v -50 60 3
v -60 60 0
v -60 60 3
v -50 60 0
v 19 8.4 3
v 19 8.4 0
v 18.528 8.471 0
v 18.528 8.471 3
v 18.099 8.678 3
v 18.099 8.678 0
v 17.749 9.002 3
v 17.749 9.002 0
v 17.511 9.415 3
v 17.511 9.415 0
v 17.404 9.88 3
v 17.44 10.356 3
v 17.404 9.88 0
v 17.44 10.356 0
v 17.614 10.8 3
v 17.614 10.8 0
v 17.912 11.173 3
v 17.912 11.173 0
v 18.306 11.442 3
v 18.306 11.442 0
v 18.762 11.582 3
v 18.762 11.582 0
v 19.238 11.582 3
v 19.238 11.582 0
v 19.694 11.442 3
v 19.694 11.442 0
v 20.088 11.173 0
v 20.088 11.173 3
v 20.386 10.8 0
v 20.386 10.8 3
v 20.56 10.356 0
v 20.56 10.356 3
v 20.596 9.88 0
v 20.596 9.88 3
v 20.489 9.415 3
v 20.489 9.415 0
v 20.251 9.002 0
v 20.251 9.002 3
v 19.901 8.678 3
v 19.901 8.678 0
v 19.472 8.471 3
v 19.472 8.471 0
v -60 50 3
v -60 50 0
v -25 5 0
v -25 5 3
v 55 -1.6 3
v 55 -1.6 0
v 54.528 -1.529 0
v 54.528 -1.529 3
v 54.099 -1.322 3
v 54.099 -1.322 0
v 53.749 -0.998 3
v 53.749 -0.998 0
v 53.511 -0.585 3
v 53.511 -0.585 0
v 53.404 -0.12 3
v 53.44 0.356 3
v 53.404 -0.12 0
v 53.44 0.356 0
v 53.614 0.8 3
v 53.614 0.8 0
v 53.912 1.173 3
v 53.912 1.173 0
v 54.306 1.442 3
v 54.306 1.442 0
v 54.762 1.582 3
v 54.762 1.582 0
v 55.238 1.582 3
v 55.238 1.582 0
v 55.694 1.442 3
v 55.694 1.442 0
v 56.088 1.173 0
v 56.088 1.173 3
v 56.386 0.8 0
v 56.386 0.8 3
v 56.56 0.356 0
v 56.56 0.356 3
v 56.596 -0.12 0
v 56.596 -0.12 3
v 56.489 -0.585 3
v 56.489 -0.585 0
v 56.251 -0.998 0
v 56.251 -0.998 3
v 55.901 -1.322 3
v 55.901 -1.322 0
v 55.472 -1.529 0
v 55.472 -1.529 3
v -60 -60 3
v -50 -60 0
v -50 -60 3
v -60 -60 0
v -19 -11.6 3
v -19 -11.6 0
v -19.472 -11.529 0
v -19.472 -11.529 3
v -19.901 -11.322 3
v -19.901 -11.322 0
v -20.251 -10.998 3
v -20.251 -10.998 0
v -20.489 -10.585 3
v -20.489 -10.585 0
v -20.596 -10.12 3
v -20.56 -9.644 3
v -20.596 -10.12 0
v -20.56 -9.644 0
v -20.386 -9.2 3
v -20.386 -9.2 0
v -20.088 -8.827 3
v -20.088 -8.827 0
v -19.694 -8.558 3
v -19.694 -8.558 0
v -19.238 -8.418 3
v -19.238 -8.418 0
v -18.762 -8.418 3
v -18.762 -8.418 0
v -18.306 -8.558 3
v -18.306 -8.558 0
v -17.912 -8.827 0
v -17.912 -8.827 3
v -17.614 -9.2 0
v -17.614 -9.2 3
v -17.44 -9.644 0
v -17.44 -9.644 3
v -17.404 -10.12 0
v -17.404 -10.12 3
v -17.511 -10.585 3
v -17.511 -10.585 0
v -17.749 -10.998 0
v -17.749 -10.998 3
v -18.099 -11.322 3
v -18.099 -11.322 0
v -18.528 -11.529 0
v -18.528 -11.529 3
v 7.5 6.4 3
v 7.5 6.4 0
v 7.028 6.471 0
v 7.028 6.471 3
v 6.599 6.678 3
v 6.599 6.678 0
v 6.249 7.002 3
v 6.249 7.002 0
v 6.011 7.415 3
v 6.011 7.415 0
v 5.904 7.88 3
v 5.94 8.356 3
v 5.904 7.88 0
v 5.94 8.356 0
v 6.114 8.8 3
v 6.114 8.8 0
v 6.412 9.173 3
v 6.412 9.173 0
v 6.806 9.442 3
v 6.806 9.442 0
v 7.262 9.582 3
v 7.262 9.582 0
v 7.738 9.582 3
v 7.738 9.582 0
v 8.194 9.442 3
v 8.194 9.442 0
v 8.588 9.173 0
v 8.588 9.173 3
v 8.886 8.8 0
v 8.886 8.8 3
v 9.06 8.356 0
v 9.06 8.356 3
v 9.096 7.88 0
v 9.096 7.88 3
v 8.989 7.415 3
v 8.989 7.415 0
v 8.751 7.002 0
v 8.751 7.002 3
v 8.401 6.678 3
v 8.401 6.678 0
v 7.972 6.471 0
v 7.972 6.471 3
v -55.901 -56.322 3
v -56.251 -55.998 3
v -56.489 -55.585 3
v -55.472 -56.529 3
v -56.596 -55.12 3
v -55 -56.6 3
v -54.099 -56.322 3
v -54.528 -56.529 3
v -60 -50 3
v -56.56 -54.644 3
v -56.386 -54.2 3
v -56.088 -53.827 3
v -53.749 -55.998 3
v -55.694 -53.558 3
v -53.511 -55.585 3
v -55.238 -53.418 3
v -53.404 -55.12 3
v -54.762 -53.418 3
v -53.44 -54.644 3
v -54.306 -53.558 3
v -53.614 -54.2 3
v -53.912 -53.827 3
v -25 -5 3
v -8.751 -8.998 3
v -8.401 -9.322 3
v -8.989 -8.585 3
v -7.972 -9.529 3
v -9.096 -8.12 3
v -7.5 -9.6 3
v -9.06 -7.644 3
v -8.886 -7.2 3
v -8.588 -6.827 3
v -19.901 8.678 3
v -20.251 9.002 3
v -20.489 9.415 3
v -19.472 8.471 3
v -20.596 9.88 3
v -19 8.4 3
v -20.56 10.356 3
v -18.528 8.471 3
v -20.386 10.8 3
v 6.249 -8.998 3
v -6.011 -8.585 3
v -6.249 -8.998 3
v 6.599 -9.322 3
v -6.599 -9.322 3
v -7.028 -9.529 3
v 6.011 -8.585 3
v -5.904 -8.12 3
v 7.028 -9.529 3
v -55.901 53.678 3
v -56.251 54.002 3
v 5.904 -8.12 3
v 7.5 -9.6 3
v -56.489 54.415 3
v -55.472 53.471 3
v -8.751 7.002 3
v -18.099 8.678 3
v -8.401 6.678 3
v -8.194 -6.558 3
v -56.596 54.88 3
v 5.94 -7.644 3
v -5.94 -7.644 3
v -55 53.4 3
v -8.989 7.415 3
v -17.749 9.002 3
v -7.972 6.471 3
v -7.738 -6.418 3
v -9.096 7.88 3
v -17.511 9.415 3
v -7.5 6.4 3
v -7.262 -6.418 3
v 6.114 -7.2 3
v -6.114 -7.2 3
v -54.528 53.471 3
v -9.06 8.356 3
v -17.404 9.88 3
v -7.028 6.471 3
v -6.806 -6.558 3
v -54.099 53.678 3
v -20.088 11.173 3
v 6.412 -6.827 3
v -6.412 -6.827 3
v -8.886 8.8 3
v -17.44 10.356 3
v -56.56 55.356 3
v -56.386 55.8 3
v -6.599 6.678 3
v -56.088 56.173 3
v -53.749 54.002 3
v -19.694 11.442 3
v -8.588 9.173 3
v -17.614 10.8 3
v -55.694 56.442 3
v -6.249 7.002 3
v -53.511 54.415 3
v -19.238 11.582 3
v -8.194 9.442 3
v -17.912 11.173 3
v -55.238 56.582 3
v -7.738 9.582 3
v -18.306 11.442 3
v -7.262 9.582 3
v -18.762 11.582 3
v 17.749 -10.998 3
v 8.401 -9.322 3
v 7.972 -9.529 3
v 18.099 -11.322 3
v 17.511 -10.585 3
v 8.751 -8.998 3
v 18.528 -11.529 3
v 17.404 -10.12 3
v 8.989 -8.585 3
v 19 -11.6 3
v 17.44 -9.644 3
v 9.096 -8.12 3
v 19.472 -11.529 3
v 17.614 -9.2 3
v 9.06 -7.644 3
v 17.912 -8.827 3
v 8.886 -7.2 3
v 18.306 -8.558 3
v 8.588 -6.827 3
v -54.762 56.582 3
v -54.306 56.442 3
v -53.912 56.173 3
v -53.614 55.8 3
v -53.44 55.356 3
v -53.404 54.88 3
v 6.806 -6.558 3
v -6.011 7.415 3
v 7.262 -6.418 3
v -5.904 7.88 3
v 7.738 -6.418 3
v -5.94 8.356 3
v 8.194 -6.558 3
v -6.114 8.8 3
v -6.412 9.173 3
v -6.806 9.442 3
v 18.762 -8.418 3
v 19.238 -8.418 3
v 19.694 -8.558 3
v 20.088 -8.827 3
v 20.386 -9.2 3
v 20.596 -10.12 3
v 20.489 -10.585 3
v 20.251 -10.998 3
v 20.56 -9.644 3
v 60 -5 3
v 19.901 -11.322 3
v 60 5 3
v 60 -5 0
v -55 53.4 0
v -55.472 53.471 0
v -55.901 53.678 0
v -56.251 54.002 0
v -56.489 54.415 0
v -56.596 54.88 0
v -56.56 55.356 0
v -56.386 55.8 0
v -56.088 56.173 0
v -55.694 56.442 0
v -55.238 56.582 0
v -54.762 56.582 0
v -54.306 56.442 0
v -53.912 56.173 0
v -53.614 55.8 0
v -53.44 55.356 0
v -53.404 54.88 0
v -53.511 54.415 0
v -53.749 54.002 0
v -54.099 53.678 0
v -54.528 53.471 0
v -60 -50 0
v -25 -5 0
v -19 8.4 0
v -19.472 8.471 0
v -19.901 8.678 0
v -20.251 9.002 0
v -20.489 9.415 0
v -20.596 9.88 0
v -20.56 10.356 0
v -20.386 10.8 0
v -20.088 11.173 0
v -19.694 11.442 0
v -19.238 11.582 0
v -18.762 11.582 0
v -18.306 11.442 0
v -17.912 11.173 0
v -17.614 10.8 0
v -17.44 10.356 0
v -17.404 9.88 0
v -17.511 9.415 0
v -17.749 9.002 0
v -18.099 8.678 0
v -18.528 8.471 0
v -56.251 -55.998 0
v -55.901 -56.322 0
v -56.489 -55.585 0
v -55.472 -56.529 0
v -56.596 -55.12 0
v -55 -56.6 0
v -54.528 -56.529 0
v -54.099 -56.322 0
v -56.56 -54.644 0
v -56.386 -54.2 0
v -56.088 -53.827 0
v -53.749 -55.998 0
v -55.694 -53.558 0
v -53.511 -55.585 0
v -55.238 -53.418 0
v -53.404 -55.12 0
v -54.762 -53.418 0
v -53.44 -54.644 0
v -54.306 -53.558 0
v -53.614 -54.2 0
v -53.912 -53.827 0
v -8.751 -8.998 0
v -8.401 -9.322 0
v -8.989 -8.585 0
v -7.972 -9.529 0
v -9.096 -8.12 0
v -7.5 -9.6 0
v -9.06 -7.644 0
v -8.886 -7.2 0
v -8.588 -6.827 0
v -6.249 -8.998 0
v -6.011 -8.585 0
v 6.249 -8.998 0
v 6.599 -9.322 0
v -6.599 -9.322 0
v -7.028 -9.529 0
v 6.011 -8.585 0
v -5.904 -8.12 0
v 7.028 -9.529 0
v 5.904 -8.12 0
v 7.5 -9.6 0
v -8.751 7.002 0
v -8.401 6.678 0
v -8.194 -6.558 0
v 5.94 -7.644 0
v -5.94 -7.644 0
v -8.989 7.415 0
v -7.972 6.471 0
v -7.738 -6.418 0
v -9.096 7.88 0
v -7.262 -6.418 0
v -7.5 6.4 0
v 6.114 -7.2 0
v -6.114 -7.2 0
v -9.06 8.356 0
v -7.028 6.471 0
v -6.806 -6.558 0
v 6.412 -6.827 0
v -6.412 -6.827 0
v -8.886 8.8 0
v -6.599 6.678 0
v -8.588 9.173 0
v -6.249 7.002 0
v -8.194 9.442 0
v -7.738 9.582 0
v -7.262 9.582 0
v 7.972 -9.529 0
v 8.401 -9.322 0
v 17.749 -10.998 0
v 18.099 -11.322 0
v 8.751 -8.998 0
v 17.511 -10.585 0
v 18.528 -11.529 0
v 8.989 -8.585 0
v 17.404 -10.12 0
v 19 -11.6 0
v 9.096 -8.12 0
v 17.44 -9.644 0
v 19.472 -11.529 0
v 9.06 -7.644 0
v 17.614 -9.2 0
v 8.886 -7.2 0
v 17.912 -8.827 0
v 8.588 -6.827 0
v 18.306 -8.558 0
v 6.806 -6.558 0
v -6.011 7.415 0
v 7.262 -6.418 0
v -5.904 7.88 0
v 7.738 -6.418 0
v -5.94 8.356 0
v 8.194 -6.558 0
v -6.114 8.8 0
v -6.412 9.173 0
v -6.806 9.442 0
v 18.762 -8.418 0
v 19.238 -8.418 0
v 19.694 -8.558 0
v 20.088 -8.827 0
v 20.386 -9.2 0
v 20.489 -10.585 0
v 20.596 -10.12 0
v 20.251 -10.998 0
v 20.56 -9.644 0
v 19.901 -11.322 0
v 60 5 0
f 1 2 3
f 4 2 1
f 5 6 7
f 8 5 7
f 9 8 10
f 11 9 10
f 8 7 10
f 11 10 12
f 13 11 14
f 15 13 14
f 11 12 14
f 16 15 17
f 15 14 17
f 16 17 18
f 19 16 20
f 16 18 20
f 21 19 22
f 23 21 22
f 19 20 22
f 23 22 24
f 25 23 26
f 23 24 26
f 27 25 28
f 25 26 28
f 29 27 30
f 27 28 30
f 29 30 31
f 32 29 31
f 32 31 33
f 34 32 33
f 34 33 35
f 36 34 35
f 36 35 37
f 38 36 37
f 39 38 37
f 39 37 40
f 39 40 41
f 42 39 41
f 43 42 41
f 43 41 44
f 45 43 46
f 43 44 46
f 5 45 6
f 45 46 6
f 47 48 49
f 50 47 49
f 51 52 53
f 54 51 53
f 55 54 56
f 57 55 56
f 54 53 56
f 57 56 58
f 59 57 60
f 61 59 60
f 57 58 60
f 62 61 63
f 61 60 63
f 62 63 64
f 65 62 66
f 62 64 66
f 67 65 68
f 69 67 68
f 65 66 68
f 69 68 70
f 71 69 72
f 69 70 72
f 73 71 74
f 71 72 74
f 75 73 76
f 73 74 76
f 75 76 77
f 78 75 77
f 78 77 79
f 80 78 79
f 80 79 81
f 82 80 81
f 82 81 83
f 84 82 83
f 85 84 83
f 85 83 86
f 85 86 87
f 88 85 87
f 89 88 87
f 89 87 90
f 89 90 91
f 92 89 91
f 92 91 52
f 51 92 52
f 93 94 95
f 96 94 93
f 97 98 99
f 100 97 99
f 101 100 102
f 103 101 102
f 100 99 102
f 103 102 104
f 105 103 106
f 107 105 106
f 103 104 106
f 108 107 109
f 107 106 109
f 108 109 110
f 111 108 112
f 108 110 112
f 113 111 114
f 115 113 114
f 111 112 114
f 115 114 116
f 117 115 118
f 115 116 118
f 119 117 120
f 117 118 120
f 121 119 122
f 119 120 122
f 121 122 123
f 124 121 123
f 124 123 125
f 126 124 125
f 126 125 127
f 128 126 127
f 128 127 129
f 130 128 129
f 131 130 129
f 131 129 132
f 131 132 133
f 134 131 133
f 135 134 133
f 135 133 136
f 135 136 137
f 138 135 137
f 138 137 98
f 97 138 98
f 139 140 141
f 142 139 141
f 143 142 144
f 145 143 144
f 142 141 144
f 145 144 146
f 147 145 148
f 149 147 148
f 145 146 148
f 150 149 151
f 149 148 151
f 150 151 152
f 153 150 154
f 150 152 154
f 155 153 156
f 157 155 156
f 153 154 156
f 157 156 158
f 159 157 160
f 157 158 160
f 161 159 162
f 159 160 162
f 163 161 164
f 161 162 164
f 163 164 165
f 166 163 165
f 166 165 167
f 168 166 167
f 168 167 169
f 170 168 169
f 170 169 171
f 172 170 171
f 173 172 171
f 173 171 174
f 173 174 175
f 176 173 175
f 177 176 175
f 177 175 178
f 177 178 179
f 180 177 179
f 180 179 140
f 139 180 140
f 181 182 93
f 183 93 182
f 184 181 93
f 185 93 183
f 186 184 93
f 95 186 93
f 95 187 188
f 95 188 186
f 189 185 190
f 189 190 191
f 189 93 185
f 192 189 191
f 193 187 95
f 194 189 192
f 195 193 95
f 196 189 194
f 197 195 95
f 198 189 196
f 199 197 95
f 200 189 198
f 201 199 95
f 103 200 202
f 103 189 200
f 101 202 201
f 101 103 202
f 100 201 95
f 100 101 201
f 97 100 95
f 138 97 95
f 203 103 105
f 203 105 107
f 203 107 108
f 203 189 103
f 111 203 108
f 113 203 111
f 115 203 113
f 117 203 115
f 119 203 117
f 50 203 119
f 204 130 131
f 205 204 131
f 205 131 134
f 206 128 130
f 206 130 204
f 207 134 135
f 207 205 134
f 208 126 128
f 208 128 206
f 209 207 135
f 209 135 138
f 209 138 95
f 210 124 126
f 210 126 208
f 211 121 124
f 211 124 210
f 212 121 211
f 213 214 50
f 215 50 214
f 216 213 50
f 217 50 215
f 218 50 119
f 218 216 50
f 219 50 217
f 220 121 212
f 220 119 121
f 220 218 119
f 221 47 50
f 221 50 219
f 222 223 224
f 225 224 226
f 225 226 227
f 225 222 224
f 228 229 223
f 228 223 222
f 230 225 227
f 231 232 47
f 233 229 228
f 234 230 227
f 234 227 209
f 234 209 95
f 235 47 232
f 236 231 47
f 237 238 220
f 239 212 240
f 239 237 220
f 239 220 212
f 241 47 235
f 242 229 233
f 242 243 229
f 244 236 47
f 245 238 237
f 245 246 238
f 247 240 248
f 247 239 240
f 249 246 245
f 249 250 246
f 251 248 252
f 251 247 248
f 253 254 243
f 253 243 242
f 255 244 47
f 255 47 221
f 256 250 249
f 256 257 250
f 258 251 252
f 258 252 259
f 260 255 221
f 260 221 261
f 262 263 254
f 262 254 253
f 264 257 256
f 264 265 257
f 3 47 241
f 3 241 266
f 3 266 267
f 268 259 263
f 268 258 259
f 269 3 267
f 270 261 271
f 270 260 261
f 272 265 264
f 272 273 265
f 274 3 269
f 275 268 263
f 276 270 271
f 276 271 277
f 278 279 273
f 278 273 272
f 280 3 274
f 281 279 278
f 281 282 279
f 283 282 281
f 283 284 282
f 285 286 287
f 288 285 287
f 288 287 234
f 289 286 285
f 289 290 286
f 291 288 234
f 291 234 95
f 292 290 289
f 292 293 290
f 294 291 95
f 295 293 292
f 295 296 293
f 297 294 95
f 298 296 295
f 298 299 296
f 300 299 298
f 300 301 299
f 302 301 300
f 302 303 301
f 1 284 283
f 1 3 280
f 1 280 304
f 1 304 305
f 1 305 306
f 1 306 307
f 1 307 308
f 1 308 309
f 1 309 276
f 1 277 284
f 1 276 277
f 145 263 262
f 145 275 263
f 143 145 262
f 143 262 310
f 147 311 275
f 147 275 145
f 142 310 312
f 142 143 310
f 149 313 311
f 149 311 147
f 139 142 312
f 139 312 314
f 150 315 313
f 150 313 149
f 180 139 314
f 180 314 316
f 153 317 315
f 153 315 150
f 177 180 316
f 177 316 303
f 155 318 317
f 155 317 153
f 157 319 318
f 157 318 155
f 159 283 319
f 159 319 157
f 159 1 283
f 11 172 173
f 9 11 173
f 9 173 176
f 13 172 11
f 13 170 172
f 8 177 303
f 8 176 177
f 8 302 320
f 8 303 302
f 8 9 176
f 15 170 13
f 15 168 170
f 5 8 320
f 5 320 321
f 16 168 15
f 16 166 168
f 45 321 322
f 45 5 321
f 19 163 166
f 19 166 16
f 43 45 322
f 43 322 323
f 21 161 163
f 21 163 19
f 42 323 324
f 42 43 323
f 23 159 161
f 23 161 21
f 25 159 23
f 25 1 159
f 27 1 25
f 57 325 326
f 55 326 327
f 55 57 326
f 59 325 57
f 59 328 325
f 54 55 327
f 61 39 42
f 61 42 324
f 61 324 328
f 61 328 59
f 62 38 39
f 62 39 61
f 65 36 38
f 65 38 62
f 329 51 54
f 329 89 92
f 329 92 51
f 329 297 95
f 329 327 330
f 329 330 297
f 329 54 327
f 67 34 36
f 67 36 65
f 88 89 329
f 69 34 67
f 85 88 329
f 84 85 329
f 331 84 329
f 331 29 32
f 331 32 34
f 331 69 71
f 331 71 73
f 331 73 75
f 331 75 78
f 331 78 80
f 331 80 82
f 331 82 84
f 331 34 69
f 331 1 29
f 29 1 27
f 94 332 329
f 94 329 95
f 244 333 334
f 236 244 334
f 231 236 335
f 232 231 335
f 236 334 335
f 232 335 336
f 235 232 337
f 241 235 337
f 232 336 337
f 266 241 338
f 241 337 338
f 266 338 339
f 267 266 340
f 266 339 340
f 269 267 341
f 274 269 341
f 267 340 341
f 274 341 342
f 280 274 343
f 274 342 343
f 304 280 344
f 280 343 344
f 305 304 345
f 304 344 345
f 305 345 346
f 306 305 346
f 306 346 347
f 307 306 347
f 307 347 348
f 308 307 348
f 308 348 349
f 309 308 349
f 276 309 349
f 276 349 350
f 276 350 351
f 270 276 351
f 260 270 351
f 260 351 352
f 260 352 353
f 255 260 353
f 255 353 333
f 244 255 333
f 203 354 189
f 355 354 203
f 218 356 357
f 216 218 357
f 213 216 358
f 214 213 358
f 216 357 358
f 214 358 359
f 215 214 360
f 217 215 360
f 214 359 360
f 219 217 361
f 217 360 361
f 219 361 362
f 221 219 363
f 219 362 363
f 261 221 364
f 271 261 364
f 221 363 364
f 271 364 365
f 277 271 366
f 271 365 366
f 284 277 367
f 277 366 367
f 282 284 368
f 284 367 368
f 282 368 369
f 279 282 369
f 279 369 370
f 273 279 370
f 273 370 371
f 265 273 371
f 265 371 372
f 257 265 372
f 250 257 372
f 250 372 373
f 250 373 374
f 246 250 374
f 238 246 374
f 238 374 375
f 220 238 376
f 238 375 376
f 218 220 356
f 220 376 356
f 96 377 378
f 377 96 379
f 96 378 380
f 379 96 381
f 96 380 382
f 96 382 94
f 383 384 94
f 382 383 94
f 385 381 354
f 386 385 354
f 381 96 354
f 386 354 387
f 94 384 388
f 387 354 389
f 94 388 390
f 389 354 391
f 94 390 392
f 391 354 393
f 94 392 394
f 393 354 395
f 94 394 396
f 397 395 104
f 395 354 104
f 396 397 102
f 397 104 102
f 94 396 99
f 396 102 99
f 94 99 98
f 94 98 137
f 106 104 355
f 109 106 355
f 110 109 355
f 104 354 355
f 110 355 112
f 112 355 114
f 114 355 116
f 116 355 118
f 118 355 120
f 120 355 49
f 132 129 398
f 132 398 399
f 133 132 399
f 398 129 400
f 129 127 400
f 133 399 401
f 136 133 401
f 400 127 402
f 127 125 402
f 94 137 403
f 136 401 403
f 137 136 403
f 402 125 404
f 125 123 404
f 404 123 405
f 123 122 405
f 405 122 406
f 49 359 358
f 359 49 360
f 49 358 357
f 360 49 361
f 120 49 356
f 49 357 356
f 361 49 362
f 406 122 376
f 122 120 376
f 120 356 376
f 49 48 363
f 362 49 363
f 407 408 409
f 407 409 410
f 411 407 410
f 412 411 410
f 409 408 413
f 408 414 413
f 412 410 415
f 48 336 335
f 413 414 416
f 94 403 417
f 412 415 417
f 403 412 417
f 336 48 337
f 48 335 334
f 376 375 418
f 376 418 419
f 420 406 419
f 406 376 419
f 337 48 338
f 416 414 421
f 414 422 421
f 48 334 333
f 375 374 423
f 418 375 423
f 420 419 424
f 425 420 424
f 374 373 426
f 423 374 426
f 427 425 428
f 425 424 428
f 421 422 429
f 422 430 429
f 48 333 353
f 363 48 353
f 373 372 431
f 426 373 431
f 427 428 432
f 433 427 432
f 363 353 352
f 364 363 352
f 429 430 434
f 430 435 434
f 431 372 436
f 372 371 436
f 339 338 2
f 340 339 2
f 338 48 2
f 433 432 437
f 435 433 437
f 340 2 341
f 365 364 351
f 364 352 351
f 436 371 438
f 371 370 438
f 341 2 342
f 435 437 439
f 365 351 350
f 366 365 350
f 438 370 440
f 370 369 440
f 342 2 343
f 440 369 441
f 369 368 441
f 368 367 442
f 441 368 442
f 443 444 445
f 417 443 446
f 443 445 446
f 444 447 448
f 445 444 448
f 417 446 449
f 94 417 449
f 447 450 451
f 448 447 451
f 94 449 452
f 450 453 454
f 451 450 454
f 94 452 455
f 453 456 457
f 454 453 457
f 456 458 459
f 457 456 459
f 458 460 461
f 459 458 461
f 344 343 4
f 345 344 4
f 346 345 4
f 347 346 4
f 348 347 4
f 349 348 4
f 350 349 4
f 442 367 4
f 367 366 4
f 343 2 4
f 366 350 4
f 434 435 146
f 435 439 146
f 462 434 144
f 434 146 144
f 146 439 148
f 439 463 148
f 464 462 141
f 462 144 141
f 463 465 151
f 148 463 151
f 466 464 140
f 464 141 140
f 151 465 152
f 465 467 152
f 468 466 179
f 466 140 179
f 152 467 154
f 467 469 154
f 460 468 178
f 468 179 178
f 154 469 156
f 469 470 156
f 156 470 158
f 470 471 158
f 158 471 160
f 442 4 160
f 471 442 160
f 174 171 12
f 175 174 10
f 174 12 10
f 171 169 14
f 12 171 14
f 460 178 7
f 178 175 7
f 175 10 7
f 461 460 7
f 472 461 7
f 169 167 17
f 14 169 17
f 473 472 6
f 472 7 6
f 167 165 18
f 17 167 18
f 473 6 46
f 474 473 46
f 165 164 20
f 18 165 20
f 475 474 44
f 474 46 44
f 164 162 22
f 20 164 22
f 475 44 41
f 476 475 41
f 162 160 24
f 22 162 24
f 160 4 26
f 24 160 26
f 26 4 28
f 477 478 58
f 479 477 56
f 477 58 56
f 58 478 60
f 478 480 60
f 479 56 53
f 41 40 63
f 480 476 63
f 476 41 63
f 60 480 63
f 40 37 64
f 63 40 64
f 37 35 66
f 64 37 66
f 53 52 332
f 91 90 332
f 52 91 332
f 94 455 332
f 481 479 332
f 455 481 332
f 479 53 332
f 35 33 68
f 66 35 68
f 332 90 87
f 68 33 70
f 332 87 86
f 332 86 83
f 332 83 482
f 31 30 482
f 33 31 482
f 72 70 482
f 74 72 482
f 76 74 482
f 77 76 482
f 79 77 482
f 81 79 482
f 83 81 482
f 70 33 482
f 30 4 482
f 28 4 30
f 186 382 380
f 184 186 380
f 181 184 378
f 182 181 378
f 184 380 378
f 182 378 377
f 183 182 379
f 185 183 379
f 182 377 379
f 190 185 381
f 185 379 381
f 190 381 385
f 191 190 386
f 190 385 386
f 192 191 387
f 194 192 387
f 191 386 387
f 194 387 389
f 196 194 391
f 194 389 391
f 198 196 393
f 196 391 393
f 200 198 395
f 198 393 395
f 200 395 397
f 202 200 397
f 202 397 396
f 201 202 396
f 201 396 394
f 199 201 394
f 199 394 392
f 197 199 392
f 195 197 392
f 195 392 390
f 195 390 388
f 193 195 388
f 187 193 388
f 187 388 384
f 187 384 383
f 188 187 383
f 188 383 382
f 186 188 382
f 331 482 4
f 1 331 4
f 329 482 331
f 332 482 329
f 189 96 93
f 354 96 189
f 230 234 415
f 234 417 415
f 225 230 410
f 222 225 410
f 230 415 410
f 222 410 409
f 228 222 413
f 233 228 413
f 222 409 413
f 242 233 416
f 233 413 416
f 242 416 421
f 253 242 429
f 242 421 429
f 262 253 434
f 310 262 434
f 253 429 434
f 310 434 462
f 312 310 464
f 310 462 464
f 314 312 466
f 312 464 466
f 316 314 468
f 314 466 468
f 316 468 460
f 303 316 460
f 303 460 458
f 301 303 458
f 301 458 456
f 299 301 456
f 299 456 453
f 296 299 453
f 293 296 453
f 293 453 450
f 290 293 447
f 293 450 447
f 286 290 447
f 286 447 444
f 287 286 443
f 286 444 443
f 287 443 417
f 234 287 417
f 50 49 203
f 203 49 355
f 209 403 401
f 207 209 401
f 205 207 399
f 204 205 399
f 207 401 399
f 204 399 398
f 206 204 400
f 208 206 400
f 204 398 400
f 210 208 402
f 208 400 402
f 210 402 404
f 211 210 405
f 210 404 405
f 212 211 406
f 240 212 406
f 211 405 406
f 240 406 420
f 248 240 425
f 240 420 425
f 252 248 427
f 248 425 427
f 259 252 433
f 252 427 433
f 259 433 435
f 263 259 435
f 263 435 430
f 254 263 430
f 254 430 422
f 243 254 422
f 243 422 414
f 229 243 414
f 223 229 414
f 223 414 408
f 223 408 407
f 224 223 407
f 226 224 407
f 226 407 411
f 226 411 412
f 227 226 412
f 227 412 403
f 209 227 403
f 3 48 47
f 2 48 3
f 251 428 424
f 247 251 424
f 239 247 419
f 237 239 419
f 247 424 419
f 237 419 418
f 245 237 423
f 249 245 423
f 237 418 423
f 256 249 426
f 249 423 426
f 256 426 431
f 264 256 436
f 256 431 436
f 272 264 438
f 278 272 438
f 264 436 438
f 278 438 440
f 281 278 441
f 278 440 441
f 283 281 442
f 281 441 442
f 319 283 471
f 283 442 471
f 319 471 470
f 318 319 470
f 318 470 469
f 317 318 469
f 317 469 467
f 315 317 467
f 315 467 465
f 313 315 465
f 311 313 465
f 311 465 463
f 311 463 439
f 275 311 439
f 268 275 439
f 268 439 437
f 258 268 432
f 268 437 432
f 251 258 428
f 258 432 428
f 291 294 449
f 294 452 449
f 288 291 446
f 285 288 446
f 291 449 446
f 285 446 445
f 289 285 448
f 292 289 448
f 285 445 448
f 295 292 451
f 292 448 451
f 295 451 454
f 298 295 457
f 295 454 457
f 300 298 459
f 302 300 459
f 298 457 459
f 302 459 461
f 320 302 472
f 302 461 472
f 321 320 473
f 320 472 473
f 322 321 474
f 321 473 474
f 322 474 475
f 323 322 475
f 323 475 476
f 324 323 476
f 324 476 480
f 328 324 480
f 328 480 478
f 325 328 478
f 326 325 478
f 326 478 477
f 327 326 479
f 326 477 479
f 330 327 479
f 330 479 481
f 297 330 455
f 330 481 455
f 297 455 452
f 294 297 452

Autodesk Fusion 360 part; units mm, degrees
sketch "Sketch1" plane through (0, 0, 0) normal (0, 0, 1) x (1, 0, 0)
  line L0 (60, -60) -> (-60, -60)
  line L1 (-60, -60) -> (-60, 60)
  line L2 (-60, 60) -> (60, 60)
  line L3 (60, 60) -> (60, -60)
  line L4 (60, -60) -> (-60, 60) construction
  line L5 (-60, -60) -> (60, 60) construction
  line L6 (25, 20) -> (-25, 20)
  line L7 (-25, 20) -> (-25, -20)
  line L8 (-25, -20) -> (25, -20)
  line L9 (25, -20) -> (25, 20)
  line L10 (25, 20) -> (-25, -20) construction
  line L11 (-25, 20) -> (25, -20) construction
  line L12 (60, 5) -> (-50, 60)
  line L13 (60, -5) -> (-50, -60)
  line L14 (-60, 50) -> (-25, 5)
  line L15 (-60, -50) -> (-25, -5)
  dimension "d1" = 120
  dimension "d2" = 120
  dimension "d6" = 50
  dimension "d7" = 40
  dimension "d29" = 5
  dimension "d30" = 5
  dimension "d31" = 10
  dimension "d34" = 10
  dimension "d41" = 10
  dimension "d42" = 10
extrude "Extrude1" add sketch "Sketch1" along normal blind 3 contours L0 L1 L2 L3 L6 L7 L8 L9 L12 L13 L14 L15 | L6 L7 L8 L9
sketch "Sketch2" plane through (0, 0, 3) normal (0, 0, 1) x (-1, 0, 0)
  line L0 (60, 50) -> (60, 60)
  line L1 (60, 60) -> (50, 60)
  line L2 (50, 60) -> (-60, 5)
  line L3 (-60, 5) -> (-60, -5)
  line L4 (-60, -5) -> (50, -60)
  line L5 (50, -60) -> (60, -60)
  line L6 (60, -60) -> (60, -50)
  line L7 (25, 5) -> (60, 50)
  line L8 (60, -50) -> (25, -5)
  line L9 (25, -5) -> (25, 5)
  point P0 (-7.5, -8)
  point P1 (19, -10)
  point P2 (7.5, -8)
  point P3 (-7.5, 8)
  point P4 (7.5, 8)
  point P5 (-19, -10)
  point P6 (19, 10)
  point P7 (-19, 10)
  point P8 (55, -55)
  point P9 (-55, 0)
  point P10 (55, 55)
  dimension "d12" = 7.5
  dimension "d13" = 8
  dimension "d14" = 19
  dimension "d15" = 10
  dimension "d18" = 15
  dimension "d19" = 16
  dimension "d22" = -38
  dimension "d23" = 20
  dimension "d47" = 5
  dimension "d48" = 5
  dimension "d49" = 5
  dimension "d50" = 5
  dimension "d51" = 5
hole "Hole1" at (-19, 10, 3) at (-7.5, 8, 3) at (7.5, 8, 3) at (19, 10, 3) at (19, -10, 3) at (7.5, -8, 3) at (-7.5, -8, 3) at (-19, -10, 3) at (-55, -55, 3) at (55, 0, 3) at (-55, 55, 3) direction (0, 0, -1) diameter 3.2 depth 30 tip angle 118
